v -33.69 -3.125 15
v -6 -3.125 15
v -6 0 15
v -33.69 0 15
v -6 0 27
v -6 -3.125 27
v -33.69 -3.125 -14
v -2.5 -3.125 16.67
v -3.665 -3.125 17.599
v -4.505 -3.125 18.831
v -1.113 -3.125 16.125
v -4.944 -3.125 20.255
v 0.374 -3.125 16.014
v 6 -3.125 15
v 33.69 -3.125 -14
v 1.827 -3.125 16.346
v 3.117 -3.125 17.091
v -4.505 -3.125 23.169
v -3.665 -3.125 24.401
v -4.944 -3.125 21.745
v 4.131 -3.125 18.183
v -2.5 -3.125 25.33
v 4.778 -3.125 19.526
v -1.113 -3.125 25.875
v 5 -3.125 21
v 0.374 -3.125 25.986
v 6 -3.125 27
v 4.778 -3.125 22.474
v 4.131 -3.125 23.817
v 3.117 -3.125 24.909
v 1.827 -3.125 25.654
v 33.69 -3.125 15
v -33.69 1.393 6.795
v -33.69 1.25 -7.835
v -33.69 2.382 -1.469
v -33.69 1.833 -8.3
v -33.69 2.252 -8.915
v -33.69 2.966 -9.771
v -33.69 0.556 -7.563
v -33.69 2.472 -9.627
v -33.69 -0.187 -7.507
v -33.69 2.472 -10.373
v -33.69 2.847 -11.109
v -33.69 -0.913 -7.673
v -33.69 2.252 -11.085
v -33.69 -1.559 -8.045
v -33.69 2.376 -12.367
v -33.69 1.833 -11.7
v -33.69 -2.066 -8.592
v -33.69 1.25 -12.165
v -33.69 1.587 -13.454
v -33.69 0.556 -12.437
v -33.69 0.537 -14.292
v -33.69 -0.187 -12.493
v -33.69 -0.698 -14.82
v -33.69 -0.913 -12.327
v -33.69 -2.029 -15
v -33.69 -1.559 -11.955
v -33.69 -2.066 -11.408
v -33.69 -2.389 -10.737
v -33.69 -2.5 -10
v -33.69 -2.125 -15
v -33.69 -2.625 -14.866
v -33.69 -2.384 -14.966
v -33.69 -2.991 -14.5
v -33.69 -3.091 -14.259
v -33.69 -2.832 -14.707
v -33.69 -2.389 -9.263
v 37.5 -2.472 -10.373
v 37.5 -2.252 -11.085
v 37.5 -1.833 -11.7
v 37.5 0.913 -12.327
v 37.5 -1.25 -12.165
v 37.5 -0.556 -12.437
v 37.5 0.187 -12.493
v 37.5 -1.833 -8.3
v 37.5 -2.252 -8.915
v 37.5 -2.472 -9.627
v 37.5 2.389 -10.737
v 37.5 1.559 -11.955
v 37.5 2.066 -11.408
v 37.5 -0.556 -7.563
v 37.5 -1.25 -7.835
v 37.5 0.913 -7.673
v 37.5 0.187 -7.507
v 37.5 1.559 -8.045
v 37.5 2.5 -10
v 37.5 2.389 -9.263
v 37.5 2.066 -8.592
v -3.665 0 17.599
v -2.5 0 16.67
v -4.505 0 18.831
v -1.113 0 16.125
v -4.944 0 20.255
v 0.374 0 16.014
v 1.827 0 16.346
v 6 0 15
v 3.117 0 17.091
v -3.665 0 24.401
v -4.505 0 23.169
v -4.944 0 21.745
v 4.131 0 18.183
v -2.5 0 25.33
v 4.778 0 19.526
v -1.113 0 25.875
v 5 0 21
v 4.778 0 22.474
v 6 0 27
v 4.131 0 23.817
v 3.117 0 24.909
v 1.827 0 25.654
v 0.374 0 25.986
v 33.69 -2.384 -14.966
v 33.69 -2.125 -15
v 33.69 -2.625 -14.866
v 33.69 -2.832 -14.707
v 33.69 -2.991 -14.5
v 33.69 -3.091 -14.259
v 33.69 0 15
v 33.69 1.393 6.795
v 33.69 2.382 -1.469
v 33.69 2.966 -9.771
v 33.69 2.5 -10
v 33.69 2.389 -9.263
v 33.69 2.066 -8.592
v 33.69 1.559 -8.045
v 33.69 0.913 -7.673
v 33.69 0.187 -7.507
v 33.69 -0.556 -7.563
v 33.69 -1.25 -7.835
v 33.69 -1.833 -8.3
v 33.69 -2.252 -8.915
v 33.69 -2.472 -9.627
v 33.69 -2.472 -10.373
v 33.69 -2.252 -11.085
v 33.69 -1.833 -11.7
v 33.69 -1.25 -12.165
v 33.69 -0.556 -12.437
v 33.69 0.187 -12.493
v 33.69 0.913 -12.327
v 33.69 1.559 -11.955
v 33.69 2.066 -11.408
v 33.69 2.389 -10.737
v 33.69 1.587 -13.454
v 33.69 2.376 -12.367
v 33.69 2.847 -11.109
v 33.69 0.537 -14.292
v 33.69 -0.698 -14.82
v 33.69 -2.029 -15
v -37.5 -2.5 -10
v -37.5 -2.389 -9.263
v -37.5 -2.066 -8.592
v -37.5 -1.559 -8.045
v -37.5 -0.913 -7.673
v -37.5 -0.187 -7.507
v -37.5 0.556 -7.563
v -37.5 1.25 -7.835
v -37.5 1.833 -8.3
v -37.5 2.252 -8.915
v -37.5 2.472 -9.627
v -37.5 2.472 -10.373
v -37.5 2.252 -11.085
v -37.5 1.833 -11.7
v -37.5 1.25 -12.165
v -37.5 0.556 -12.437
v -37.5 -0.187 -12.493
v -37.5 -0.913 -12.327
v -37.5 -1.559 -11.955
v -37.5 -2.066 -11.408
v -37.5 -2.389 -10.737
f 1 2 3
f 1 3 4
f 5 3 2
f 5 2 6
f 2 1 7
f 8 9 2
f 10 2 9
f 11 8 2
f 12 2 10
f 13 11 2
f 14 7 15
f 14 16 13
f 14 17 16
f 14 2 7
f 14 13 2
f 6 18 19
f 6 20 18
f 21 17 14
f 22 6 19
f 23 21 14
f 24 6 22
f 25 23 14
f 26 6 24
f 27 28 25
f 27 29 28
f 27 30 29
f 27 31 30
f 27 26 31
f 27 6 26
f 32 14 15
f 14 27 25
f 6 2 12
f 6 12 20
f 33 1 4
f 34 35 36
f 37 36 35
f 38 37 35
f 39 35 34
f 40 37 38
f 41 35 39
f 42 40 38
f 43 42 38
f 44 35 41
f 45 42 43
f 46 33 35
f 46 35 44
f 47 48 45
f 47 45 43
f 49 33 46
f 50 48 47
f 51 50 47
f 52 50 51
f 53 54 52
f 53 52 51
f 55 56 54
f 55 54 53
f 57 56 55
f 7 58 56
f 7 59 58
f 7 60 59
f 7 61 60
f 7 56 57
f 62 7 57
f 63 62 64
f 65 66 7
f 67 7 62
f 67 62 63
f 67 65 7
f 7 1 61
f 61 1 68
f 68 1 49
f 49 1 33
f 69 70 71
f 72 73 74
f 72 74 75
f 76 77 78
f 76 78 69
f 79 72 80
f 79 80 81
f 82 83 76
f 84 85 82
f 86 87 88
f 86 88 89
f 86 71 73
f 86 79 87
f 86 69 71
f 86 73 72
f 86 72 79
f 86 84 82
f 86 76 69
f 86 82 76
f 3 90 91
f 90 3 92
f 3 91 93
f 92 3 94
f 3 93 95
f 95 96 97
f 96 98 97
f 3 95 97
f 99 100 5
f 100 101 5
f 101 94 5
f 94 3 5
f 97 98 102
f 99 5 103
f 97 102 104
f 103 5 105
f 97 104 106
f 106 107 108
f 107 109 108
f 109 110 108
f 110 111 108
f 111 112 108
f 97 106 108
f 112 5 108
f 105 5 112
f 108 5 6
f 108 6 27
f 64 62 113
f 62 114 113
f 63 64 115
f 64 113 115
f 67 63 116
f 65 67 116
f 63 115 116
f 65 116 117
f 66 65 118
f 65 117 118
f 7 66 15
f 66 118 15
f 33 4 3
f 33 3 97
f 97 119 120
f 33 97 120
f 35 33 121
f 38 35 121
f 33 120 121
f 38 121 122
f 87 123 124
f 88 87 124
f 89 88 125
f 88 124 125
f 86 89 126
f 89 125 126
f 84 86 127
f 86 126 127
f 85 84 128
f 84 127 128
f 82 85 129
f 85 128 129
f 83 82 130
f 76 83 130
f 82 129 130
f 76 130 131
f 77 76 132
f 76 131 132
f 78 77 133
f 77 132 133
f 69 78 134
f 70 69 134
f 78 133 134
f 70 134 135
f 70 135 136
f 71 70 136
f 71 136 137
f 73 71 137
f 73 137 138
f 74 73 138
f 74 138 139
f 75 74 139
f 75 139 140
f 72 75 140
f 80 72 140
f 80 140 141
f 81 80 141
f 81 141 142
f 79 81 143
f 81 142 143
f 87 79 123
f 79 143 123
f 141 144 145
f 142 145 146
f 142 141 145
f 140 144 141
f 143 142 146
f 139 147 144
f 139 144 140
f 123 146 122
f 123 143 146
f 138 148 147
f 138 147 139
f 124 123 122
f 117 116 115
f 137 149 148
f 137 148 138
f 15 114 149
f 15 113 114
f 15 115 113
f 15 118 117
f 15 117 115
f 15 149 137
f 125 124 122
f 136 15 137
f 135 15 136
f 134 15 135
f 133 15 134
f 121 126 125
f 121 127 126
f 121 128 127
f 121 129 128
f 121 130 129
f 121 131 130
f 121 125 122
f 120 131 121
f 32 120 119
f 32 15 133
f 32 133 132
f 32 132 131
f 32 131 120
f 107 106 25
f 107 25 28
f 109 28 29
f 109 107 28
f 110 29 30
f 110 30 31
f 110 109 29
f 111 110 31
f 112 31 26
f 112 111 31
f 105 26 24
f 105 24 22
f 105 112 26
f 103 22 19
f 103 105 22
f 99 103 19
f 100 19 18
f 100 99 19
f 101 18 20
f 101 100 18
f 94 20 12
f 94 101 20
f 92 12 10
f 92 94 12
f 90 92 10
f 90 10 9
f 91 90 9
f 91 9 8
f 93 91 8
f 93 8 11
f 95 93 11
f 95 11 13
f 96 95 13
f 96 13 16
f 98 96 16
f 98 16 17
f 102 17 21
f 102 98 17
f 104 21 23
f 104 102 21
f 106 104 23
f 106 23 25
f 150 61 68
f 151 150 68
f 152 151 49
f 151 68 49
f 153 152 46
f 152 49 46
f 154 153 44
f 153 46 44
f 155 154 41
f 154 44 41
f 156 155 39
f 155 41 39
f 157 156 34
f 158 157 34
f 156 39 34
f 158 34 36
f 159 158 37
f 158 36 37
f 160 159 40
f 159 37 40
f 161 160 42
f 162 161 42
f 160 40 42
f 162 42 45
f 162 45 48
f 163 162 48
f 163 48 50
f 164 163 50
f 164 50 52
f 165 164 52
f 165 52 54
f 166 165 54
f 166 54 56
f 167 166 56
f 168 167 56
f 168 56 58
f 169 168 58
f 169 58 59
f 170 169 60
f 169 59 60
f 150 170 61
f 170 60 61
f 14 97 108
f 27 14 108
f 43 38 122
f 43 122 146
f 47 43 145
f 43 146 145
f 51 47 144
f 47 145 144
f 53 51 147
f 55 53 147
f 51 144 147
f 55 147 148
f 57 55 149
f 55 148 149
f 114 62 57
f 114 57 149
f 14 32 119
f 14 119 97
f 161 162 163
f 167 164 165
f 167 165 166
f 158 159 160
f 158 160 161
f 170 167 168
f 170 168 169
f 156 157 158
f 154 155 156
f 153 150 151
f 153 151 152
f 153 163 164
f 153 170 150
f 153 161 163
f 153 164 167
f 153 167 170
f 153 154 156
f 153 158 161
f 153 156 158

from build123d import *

# Parameters (mm, degrees)
F2_DEPTH = 3.125
F1_W     = 12
F1_H     = 12
F1_R     = 5
F3_DEPTH = 3.125
F4_R     = 2.5
F6_DEPTH = 3.81
F5_R     = 2.5
F7_DEPTH = 3.81
F8_DEPTH = 67.38
F9_R     = 5
F10_R    = 1


with BuildPart() as f2:
    # F1 (on Front) → F2 (new body, symmetric)
    with BuildSketch(Plane.XZ):
        Polygon((-6, 15), (-33.69, 15), (-33.69, -15), (33.69, -15), (33.69, 15), (6, 15), align=None)
    extrude(amount=F2_DEPTH, both=True)

    # F1 (on Front) → F3 (join, through all)
    with BuildSketch(Plane.XZ):
        with Locations((0, 21)):
            Rectangle(F1_W, F1_H)
        with Locations((0, 21)):
            Circle(F1_R, mode=Mode.SUBTRACT)
    extrude(amount=F3_DEPTH)

    # F4 (on face) → F6 (join)
    with BuildSketch(Plane.YZ.offset(33.69)):
        with Locations((0, -10)):
            Circle(F4_R)
    extrude(amount=F6_DEPTH)

    # F5 (on face) → F7 (join)
    with BuildSketch(Plane(origin=(-33.69, 0, 0), x_dir=(0, -1, 0), z_dir=(-1, 0, 0))):
        with Locations((0, -10)):
            Circle(F5_R)
    extrude(amount=F7_DEPTH)

    # F4 (on face) → F8 (cut, through all)
    with BuildSketch(Plane.YZ.offset(33.69)):
        with BuildLine():
            ThreePointArc((0, 15), (2.2291595567, 0.0694437038), (3.125, -15))
            Line((3.125, -15), (3.125, 15))
            Line((3.125, 15), (0, 15))
        make_face()
    extrude(amount=-F8_DEPTH, mode=Mode.SUBTRACT)

    # F9
    f9_edges = [f2.edges().sort_by_distance(p)[0] for p in [
        (0, 3.125, -15),
    ]]
    fillet(f9_edges, radius=F9_R)

    # F10
    f10_edges = [f2.edges().sort_by_distance(p)[0] for p in [
        (0, -3.125, -15),
    ]]
    fillet(f10_edges, radius=F10_R)


solid = f2.part
